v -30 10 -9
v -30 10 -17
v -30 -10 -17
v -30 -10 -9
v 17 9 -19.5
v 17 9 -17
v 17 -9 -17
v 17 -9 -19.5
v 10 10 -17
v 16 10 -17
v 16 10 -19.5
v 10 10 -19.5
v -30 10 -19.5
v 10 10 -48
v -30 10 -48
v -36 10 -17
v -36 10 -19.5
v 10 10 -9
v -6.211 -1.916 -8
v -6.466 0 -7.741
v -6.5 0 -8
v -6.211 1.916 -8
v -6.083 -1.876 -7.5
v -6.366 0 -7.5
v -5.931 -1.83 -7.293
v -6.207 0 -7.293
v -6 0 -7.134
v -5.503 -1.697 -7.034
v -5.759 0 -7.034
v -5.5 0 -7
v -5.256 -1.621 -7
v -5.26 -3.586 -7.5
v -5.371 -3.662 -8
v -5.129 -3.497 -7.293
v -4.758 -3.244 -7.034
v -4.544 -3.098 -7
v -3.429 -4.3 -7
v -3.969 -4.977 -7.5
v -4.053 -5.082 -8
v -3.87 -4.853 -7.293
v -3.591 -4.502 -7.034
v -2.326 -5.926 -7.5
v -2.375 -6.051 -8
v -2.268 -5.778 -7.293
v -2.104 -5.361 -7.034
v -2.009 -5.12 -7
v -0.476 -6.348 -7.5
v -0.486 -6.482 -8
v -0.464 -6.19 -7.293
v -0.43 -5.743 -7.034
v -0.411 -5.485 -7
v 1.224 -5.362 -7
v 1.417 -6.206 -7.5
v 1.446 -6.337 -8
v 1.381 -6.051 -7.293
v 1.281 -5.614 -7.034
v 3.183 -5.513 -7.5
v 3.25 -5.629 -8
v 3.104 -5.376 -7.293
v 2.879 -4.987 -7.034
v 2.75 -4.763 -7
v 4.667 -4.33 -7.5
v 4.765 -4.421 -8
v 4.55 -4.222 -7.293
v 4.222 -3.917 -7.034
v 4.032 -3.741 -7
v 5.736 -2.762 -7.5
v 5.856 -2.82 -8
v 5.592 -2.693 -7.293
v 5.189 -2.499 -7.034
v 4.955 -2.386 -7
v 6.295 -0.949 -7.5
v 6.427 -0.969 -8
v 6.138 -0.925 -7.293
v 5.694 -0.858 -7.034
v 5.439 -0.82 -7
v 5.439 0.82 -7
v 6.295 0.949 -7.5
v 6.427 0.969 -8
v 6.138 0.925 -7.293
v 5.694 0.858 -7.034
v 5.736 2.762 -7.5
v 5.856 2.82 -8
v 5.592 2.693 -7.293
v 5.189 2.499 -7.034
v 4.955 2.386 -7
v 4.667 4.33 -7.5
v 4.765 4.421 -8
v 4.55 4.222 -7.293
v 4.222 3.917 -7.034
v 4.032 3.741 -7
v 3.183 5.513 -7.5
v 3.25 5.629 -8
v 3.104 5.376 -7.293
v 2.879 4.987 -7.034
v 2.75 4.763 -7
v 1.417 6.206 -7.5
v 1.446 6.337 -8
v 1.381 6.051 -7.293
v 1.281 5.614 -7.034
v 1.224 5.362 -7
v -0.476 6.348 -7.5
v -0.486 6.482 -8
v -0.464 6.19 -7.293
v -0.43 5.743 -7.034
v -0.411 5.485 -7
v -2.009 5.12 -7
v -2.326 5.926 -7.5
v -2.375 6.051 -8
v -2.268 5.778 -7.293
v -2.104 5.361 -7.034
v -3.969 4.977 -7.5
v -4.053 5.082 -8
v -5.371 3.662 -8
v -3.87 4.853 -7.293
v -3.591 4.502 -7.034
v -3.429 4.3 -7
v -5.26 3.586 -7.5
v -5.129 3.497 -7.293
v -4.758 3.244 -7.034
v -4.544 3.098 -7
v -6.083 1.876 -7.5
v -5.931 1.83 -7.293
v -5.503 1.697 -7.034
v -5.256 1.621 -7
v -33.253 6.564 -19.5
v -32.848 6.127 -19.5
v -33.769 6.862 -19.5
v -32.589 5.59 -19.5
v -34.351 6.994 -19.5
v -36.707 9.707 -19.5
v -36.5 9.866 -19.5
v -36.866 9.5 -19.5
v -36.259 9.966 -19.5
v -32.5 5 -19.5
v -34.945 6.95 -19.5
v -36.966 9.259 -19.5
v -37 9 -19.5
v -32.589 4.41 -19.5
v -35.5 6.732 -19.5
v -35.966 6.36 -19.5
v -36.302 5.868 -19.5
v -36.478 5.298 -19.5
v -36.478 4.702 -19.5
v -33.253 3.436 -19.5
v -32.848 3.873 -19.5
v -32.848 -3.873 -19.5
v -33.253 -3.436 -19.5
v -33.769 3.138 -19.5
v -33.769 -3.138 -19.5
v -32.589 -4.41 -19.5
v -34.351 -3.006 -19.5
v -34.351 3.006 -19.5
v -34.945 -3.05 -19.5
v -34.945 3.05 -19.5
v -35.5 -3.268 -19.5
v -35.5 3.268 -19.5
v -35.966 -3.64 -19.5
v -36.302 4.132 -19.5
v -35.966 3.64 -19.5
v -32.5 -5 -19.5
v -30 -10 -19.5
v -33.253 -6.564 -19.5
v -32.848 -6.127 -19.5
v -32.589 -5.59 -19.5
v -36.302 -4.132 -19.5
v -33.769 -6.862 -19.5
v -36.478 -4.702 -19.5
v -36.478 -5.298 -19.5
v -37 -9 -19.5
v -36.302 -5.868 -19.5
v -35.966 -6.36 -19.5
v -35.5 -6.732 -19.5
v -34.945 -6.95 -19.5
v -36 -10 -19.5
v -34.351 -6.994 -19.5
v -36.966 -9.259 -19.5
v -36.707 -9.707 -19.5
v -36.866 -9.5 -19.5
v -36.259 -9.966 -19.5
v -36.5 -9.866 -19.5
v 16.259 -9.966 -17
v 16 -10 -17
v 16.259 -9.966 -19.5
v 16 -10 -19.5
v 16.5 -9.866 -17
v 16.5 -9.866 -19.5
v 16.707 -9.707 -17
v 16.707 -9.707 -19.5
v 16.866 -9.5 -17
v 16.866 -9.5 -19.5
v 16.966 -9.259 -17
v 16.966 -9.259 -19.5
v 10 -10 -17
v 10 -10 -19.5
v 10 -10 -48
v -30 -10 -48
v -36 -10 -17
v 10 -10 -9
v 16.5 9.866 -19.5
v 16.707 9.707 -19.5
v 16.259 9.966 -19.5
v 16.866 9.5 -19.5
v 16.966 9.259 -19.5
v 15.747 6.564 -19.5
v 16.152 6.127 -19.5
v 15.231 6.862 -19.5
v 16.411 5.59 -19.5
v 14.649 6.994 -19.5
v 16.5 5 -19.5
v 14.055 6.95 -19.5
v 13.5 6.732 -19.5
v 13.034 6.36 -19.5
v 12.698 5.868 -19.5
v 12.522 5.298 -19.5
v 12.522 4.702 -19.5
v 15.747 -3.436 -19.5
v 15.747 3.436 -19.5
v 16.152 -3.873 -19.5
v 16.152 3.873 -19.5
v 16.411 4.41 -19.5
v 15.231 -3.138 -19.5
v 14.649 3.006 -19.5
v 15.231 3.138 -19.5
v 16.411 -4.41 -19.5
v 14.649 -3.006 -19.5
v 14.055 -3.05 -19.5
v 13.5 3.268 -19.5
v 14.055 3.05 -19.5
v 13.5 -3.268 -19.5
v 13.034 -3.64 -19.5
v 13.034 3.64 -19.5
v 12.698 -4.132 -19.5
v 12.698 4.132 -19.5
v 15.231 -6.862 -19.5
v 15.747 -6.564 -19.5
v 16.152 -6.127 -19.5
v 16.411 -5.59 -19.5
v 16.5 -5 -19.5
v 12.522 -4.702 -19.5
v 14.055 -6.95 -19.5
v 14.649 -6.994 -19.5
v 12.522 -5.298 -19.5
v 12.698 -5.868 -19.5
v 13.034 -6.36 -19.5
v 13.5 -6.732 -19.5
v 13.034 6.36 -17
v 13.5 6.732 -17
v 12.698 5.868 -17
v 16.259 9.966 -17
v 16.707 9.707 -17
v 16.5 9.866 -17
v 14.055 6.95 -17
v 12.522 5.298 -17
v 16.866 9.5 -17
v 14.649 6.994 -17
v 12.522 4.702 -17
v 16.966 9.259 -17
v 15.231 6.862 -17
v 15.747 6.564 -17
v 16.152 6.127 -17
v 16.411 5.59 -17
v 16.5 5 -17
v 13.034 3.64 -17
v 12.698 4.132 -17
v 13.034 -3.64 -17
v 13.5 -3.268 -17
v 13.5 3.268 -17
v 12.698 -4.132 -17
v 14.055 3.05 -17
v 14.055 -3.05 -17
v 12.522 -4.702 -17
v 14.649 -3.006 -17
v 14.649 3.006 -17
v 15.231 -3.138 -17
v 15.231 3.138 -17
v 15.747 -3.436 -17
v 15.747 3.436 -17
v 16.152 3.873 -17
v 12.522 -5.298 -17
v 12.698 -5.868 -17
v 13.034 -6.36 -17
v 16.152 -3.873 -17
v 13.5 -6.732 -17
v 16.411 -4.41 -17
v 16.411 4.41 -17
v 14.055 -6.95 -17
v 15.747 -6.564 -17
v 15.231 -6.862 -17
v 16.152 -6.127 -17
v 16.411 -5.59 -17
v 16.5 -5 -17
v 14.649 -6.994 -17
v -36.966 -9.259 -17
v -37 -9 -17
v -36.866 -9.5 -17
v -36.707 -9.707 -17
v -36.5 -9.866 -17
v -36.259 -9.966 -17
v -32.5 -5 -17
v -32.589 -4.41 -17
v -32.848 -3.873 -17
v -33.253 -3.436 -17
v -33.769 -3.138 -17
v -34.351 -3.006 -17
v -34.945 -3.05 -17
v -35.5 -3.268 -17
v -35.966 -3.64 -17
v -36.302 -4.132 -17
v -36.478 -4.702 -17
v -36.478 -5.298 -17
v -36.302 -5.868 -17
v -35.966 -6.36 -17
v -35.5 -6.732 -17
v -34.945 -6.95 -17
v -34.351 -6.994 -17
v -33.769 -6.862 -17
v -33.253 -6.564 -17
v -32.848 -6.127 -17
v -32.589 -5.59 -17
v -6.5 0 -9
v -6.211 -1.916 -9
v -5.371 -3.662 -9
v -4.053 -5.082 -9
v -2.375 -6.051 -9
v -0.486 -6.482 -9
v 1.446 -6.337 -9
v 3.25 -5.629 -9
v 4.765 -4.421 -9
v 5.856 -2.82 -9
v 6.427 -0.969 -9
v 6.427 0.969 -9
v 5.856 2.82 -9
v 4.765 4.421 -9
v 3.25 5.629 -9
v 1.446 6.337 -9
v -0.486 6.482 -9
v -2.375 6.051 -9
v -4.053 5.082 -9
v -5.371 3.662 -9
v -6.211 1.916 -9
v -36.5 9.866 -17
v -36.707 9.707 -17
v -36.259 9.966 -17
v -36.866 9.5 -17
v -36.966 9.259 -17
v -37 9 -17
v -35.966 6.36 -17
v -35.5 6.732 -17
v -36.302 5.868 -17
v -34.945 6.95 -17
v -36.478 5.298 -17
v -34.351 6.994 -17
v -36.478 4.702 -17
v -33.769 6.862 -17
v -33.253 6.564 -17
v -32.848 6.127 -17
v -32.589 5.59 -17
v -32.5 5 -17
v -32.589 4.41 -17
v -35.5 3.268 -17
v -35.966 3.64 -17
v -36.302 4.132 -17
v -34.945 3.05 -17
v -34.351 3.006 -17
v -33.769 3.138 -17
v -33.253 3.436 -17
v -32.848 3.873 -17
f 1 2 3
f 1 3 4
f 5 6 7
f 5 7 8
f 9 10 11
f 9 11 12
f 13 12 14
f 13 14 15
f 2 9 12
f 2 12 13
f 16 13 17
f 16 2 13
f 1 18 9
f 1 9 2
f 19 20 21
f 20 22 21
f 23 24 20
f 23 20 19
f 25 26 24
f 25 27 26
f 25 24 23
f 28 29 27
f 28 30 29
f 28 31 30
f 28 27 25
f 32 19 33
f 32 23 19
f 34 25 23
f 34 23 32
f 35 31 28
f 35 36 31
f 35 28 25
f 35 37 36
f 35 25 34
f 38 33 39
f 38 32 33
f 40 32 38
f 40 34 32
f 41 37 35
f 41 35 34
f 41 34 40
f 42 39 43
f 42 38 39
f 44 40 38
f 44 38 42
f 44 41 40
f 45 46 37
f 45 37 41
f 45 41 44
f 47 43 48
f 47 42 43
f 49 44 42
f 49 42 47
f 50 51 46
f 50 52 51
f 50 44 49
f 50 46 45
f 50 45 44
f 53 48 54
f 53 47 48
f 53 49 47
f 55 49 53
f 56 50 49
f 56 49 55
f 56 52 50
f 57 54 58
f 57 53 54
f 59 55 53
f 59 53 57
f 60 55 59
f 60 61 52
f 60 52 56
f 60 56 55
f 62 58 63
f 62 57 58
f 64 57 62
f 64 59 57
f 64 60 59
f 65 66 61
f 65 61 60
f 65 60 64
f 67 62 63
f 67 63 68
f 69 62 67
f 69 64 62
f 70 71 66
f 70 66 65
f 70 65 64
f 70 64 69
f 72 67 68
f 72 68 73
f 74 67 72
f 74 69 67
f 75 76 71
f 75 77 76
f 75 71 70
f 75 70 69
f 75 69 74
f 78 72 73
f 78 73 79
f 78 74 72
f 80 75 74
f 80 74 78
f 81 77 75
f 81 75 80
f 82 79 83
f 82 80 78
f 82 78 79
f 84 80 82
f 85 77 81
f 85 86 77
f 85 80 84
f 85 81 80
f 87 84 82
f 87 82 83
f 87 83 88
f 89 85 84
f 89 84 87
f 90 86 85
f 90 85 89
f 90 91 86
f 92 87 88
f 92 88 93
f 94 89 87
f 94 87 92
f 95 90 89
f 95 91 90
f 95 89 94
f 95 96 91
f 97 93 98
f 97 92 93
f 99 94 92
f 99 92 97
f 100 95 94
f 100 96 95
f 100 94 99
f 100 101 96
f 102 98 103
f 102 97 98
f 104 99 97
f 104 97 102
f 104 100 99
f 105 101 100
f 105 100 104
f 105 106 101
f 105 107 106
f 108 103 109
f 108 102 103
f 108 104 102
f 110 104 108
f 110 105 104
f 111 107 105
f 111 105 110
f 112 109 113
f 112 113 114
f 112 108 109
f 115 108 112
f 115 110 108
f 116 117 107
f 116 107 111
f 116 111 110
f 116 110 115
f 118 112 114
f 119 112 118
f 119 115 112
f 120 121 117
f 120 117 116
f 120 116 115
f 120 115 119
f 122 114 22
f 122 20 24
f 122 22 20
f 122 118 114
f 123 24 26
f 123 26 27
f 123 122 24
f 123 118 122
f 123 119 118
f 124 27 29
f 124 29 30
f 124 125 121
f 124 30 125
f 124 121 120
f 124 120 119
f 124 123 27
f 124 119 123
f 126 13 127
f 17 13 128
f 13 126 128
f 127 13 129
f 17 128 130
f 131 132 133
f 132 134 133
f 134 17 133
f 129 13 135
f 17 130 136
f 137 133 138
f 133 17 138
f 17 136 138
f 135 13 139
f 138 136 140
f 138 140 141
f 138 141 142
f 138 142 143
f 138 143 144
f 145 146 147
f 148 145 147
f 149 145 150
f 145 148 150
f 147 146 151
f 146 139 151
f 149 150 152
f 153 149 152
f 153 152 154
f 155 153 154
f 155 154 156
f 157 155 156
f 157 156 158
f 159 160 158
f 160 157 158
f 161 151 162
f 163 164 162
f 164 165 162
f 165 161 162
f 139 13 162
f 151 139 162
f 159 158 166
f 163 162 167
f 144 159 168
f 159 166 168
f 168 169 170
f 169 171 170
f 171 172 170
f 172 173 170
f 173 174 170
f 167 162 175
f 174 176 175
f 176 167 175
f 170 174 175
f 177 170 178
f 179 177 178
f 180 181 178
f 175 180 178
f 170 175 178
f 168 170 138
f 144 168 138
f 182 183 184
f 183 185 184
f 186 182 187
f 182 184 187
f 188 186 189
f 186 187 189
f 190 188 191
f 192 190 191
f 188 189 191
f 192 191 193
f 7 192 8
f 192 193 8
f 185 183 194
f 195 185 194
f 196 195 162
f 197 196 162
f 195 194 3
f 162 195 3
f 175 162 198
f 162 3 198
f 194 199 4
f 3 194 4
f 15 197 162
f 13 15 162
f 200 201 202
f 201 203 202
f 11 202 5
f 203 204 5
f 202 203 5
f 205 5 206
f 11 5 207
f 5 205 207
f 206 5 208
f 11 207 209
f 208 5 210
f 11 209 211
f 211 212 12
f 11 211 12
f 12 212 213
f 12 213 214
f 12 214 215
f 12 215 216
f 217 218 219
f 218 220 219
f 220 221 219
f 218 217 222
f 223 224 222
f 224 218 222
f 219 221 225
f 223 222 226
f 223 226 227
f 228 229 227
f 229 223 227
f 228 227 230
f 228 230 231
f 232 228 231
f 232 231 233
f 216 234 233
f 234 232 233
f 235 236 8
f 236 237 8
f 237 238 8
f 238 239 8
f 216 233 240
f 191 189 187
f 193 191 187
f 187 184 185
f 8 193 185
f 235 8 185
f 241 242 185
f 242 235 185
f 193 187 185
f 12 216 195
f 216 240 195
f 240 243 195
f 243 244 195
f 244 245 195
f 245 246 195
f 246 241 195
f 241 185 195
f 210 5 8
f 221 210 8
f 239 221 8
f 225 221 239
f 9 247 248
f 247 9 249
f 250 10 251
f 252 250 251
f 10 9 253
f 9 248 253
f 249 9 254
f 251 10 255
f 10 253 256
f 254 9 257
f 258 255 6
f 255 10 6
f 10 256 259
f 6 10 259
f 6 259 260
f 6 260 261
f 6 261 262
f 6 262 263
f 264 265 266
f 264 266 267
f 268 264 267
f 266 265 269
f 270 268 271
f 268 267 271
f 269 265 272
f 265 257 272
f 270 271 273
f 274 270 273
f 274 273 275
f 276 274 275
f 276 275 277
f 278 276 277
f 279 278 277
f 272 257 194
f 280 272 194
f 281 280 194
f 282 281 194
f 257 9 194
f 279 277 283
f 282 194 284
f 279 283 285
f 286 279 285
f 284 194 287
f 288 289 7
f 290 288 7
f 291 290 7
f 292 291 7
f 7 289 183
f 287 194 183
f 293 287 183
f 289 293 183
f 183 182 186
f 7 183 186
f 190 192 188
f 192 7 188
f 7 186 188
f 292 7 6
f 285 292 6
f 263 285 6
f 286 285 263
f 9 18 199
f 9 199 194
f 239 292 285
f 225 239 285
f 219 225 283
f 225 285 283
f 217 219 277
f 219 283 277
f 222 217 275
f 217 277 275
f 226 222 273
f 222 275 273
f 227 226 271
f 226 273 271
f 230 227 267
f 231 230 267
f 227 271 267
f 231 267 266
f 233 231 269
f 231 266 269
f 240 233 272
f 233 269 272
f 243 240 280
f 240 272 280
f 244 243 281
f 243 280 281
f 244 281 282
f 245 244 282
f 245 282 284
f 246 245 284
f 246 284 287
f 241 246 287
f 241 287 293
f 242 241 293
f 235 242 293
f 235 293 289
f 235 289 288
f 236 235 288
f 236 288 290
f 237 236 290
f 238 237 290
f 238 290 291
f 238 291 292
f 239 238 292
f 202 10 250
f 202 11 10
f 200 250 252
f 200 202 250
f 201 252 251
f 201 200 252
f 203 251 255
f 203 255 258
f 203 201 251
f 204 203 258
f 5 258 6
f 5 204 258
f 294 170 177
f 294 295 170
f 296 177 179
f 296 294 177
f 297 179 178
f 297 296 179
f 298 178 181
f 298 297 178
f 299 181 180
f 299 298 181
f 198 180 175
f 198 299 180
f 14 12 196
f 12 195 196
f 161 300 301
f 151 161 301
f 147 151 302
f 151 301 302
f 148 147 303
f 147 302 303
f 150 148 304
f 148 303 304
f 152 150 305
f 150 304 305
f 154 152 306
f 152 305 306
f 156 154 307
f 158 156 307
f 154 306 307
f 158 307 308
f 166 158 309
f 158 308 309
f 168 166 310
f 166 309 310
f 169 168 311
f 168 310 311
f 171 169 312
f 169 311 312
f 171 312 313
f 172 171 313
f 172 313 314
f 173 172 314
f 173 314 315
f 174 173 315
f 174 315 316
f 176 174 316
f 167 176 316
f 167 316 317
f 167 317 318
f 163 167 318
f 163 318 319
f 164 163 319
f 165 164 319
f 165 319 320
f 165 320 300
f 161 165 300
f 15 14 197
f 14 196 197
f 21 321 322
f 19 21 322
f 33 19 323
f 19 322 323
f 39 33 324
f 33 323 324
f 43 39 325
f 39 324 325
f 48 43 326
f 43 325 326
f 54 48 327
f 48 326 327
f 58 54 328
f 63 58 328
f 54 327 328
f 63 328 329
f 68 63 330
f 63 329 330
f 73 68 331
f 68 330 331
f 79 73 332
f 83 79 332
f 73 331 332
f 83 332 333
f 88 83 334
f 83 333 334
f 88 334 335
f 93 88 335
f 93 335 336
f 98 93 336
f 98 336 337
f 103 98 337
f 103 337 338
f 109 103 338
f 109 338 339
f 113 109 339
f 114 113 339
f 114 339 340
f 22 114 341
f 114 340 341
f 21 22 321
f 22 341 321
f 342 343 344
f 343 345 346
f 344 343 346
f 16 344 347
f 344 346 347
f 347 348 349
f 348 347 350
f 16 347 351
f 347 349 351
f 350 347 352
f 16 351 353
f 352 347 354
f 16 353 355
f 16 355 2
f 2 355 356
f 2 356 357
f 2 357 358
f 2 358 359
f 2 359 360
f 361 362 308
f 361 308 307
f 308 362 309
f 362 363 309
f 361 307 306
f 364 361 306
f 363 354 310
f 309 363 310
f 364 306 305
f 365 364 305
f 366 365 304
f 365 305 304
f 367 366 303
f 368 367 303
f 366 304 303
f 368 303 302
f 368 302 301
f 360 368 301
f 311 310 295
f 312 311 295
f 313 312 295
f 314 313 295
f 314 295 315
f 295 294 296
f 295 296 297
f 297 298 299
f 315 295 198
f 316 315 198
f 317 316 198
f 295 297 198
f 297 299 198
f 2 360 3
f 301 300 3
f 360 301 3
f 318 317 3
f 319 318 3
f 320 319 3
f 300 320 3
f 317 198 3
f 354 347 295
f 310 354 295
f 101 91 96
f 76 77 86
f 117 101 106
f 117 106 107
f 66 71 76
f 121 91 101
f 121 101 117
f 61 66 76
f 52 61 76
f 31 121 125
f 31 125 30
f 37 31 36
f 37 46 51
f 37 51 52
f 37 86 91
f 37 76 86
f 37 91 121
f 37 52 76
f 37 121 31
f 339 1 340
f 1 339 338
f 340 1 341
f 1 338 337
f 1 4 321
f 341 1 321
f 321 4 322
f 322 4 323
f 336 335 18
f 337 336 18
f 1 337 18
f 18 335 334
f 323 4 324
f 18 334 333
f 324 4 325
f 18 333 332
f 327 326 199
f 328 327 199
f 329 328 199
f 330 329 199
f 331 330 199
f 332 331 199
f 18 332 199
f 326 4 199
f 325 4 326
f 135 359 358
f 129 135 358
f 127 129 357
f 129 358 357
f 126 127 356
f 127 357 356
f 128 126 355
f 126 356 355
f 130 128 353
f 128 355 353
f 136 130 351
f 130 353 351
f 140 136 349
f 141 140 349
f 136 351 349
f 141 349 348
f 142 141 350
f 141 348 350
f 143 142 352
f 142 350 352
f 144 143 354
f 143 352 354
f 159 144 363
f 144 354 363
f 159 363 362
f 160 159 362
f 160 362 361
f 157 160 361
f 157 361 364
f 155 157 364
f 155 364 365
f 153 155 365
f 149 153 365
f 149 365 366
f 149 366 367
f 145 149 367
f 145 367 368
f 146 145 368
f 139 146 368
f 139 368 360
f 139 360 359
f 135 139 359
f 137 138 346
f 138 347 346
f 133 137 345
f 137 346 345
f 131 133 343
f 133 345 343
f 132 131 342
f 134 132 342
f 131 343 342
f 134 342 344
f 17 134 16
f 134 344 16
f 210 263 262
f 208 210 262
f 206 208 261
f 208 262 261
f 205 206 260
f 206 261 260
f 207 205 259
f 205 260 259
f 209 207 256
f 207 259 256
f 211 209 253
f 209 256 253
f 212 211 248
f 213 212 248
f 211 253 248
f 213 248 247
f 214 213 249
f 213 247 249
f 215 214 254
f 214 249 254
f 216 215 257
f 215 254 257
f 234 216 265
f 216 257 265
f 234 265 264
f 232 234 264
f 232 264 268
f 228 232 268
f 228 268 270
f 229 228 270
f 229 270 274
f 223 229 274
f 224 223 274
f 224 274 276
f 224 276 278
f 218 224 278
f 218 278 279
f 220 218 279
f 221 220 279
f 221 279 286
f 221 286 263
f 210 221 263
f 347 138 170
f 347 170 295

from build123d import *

# Parameters (mm, degrees)
PAD050_DEPTH    = 10
SKETCH087_R     = 2
POCKET033_DEPTH = 47.001
FILLET024_R     = 1
SKETCH235_R     = 6.5
PAD096_DEPTH    = 2
FILLET011_R     = 1


with BuildPart() as part:
    # Sketch086 → Pad050 (new body, symmetric)
    with BuildSketch(Plane.XZ):
        Polygon((-37, -18.5), (-37, -16), (-30, -16), (-30, -8), (10, -8), (10, -16), (17, -16), (17, -18.5), (10, -18.5), (10, -47), (-30, -47), (-30, -18.5), align=None)
    extrude(amount=PAD050_DEPTH, both=True)

    # Sketch087 → Pocket033 (cut, through all)
    with BuildSketch(Plane.XY):
        with Locations((14.5, 5)):
            Circle(SKETCH087_R)
        with Locations((14.5, -5)):
            Circle(SKETCH087_R)
        with Locations((-34.5, 5)):
            Circle(SKETCH087_R)
        with Locations((-34.5, -5)):
            Circle(SKETCH087_R)
    extrude(amount=-POCKET033_DEPTH, mode=Mode.SUBTRACT)

    # Fillet024
    fillet024_edges = [part.edges().sort_by_distance(p)[0] for p in [
        (17, -10, -17.25),
        (17, 10, -17.25),
        (-37, -10, -17.25),
        (-37, 10, -17.25),
    ]]
    fillet(fillet024_edges, radius=FILLET024_R)

    # Sketch235 (on Face12 of Fillet024) → Pad096 (join)
    with BuildSketch(Plane(origin=(0, 0, -8), x_dir=(-1, 0, 0), z_dir=(0, 0, 1))):
        Circle(SKETCH235_R)
    extrude(amount=PAD096_DEPTH)

    # Fillet011
    fillet011_edges = [part.edges().sort_by_distance(p)[0] for p in [
        (6.5, 0, -6),
    ]]
    fillet(fillet011_edges, radius=FILLET011_R)


with BuildPart() as part_1:
    # Body041 placement: moved
    add(part.part.moved(Location((0, 0, -1))))


solid = part_1.part
